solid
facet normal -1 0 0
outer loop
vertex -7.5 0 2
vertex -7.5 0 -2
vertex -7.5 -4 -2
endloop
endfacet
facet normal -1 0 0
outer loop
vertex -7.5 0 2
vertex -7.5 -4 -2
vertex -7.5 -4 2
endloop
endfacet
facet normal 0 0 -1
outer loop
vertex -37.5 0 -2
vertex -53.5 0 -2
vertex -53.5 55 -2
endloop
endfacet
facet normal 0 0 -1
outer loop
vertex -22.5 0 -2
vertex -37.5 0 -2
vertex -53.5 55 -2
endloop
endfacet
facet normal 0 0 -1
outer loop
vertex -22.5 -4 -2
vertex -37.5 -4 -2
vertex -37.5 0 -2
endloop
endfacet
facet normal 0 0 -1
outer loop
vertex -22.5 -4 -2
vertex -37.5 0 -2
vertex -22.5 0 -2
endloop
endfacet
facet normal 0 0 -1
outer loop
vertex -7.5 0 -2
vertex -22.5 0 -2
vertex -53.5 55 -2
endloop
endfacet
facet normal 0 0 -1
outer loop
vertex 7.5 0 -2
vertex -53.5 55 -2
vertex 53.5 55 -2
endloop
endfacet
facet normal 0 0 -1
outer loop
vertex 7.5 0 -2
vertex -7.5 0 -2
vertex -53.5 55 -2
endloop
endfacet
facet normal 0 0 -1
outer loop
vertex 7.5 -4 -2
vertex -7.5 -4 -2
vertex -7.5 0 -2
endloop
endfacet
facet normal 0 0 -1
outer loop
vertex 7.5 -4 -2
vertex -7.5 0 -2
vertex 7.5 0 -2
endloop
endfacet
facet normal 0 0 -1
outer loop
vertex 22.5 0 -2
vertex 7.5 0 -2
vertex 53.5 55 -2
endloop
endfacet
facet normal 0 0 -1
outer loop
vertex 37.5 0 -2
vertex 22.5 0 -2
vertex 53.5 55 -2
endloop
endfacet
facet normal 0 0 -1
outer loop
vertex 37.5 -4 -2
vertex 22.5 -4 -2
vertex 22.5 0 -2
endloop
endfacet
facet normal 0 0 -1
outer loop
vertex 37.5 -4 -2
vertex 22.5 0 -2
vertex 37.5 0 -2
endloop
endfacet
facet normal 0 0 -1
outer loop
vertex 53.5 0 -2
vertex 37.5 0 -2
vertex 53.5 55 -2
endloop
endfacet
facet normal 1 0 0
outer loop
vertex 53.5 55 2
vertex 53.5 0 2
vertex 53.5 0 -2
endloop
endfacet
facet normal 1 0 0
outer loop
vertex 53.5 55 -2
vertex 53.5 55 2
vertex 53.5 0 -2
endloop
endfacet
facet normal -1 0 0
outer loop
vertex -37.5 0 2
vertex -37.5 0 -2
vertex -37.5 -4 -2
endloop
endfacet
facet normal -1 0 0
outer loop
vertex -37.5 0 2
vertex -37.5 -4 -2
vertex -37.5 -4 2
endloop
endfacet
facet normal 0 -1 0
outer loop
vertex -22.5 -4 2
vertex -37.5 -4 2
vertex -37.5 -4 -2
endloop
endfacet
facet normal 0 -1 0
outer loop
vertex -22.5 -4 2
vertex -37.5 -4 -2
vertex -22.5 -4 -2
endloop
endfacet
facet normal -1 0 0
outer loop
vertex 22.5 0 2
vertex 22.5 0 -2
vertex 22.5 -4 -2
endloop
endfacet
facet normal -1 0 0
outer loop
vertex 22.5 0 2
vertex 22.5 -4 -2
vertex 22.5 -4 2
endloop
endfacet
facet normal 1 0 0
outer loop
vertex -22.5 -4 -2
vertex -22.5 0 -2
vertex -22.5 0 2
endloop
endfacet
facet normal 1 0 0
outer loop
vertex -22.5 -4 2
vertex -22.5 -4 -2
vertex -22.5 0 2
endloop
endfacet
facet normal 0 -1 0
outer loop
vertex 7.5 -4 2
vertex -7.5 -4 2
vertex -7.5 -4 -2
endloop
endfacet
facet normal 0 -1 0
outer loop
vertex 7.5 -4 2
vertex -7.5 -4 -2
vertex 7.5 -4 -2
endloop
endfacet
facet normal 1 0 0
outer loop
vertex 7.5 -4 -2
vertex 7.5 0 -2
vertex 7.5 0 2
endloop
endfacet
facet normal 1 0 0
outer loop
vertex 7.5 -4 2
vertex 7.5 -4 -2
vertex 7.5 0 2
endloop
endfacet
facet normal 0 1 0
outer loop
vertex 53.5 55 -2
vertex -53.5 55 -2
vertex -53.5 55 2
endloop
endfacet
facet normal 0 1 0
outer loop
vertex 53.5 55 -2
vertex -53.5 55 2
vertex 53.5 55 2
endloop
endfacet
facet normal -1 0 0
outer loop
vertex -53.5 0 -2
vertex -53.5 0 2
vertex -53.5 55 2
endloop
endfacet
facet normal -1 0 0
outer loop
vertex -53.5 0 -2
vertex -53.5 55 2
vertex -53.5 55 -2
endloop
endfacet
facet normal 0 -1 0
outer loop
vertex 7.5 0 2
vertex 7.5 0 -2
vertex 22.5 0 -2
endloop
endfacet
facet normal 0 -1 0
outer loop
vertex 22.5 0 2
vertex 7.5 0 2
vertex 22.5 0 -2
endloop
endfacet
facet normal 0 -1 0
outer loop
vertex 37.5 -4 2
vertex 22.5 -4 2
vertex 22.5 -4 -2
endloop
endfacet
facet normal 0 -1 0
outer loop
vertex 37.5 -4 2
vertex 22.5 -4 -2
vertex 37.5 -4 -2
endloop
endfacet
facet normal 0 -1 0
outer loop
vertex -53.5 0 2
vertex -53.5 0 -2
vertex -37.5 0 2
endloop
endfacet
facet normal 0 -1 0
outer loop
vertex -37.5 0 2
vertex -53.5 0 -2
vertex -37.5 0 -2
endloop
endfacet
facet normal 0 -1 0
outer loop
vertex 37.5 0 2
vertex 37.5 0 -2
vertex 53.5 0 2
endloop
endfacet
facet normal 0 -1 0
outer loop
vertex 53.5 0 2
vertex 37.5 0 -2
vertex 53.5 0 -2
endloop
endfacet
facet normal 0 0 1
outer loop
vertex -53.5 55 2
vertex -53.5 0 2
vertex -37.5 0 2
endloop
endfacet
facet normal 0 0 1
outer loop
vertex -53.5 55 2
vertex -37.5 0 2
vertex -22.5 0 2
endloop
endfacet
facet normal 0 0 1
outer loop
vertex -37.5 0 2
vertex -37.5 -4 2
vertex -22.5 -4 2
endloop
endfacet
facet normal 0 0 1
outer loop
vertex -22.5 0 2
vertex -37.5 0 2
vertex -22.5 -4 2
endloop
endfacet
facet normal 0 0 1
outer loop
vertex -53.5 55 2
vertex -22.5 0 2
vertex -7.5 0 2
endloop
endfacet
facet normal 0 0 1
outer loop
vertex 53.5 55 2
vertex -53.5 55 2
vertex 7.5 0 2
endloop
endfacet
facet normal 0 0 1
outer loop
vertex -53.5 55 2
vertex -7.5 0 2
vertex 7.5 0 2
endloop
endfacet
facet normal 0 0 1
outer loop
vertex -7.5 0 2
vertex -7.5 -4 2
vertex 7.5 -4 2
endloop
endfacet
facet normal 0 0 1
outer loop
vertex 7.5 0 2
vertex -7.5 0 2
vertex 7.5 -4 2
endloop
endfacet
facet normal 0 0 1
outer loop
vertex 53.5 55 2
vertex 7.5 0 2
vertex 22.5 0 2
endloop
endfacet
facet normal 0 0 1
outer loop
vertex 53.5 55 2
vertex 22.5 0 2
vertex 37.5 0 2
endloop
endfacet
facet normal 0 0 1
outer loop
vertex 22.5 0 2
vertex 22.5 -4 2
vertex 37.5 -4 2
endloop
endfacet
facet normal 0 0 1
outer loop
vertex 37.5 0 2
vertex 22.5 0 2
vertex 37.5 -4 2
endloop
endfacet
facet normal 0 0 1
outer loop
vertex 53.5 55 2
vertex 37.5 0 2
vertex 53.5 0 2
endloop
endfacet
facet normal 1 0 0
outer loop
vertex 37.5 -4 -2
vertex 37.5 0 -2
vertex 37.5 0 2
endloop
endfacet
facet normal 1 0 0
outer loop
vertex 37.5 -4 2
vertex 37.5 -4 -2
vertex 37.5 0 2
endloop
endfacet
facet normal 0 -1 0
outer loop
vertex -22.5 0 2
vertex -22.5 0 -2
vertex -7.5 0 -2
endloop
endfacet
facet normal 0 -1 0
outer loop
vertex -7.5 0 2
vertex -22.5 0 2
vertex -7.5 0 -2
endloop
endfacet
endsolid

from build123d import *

# Parameters (mm, degrees)
SKETCH1_W           = 107
SKETCH1_H           = 4
BOSS_EXTRUDE1_DEPTH = 55
SKETCH2_W           = 15
SKETCH2_H           = 4
BOSS_EXTRUDE2_DEPTH = 4


with BuildPart() as part:
    # Sketch1 → Boss-Extrude1 (new body)
    with BuildSketch(Plane(origin=(0, 0, 0), x_dir=(1, 0, 0), z_dir=(0, 1, 0))):
        Rectangle(SKETCH1_W, SKETCH1_H)
    extrude(amount=BOSS_EXTRUDE1_DEPTH)

    # Sketch2 → Boss-Extrude2 (add)
    with BuildSketch(Plane.XZ):
        with Locations((-30, 0)):
            Rectangle(SKETCH2_W, SKETCH2_H)
        Rectangle(SKETCH2_W, SKETCH2_H)
        with Locations((30, 0)):
            Rectangle(SKETCH2_W, SKETCH2_H)
    extrude(amount=BOSS_EXTRUDE2_DEPTH)


solid = part.part
